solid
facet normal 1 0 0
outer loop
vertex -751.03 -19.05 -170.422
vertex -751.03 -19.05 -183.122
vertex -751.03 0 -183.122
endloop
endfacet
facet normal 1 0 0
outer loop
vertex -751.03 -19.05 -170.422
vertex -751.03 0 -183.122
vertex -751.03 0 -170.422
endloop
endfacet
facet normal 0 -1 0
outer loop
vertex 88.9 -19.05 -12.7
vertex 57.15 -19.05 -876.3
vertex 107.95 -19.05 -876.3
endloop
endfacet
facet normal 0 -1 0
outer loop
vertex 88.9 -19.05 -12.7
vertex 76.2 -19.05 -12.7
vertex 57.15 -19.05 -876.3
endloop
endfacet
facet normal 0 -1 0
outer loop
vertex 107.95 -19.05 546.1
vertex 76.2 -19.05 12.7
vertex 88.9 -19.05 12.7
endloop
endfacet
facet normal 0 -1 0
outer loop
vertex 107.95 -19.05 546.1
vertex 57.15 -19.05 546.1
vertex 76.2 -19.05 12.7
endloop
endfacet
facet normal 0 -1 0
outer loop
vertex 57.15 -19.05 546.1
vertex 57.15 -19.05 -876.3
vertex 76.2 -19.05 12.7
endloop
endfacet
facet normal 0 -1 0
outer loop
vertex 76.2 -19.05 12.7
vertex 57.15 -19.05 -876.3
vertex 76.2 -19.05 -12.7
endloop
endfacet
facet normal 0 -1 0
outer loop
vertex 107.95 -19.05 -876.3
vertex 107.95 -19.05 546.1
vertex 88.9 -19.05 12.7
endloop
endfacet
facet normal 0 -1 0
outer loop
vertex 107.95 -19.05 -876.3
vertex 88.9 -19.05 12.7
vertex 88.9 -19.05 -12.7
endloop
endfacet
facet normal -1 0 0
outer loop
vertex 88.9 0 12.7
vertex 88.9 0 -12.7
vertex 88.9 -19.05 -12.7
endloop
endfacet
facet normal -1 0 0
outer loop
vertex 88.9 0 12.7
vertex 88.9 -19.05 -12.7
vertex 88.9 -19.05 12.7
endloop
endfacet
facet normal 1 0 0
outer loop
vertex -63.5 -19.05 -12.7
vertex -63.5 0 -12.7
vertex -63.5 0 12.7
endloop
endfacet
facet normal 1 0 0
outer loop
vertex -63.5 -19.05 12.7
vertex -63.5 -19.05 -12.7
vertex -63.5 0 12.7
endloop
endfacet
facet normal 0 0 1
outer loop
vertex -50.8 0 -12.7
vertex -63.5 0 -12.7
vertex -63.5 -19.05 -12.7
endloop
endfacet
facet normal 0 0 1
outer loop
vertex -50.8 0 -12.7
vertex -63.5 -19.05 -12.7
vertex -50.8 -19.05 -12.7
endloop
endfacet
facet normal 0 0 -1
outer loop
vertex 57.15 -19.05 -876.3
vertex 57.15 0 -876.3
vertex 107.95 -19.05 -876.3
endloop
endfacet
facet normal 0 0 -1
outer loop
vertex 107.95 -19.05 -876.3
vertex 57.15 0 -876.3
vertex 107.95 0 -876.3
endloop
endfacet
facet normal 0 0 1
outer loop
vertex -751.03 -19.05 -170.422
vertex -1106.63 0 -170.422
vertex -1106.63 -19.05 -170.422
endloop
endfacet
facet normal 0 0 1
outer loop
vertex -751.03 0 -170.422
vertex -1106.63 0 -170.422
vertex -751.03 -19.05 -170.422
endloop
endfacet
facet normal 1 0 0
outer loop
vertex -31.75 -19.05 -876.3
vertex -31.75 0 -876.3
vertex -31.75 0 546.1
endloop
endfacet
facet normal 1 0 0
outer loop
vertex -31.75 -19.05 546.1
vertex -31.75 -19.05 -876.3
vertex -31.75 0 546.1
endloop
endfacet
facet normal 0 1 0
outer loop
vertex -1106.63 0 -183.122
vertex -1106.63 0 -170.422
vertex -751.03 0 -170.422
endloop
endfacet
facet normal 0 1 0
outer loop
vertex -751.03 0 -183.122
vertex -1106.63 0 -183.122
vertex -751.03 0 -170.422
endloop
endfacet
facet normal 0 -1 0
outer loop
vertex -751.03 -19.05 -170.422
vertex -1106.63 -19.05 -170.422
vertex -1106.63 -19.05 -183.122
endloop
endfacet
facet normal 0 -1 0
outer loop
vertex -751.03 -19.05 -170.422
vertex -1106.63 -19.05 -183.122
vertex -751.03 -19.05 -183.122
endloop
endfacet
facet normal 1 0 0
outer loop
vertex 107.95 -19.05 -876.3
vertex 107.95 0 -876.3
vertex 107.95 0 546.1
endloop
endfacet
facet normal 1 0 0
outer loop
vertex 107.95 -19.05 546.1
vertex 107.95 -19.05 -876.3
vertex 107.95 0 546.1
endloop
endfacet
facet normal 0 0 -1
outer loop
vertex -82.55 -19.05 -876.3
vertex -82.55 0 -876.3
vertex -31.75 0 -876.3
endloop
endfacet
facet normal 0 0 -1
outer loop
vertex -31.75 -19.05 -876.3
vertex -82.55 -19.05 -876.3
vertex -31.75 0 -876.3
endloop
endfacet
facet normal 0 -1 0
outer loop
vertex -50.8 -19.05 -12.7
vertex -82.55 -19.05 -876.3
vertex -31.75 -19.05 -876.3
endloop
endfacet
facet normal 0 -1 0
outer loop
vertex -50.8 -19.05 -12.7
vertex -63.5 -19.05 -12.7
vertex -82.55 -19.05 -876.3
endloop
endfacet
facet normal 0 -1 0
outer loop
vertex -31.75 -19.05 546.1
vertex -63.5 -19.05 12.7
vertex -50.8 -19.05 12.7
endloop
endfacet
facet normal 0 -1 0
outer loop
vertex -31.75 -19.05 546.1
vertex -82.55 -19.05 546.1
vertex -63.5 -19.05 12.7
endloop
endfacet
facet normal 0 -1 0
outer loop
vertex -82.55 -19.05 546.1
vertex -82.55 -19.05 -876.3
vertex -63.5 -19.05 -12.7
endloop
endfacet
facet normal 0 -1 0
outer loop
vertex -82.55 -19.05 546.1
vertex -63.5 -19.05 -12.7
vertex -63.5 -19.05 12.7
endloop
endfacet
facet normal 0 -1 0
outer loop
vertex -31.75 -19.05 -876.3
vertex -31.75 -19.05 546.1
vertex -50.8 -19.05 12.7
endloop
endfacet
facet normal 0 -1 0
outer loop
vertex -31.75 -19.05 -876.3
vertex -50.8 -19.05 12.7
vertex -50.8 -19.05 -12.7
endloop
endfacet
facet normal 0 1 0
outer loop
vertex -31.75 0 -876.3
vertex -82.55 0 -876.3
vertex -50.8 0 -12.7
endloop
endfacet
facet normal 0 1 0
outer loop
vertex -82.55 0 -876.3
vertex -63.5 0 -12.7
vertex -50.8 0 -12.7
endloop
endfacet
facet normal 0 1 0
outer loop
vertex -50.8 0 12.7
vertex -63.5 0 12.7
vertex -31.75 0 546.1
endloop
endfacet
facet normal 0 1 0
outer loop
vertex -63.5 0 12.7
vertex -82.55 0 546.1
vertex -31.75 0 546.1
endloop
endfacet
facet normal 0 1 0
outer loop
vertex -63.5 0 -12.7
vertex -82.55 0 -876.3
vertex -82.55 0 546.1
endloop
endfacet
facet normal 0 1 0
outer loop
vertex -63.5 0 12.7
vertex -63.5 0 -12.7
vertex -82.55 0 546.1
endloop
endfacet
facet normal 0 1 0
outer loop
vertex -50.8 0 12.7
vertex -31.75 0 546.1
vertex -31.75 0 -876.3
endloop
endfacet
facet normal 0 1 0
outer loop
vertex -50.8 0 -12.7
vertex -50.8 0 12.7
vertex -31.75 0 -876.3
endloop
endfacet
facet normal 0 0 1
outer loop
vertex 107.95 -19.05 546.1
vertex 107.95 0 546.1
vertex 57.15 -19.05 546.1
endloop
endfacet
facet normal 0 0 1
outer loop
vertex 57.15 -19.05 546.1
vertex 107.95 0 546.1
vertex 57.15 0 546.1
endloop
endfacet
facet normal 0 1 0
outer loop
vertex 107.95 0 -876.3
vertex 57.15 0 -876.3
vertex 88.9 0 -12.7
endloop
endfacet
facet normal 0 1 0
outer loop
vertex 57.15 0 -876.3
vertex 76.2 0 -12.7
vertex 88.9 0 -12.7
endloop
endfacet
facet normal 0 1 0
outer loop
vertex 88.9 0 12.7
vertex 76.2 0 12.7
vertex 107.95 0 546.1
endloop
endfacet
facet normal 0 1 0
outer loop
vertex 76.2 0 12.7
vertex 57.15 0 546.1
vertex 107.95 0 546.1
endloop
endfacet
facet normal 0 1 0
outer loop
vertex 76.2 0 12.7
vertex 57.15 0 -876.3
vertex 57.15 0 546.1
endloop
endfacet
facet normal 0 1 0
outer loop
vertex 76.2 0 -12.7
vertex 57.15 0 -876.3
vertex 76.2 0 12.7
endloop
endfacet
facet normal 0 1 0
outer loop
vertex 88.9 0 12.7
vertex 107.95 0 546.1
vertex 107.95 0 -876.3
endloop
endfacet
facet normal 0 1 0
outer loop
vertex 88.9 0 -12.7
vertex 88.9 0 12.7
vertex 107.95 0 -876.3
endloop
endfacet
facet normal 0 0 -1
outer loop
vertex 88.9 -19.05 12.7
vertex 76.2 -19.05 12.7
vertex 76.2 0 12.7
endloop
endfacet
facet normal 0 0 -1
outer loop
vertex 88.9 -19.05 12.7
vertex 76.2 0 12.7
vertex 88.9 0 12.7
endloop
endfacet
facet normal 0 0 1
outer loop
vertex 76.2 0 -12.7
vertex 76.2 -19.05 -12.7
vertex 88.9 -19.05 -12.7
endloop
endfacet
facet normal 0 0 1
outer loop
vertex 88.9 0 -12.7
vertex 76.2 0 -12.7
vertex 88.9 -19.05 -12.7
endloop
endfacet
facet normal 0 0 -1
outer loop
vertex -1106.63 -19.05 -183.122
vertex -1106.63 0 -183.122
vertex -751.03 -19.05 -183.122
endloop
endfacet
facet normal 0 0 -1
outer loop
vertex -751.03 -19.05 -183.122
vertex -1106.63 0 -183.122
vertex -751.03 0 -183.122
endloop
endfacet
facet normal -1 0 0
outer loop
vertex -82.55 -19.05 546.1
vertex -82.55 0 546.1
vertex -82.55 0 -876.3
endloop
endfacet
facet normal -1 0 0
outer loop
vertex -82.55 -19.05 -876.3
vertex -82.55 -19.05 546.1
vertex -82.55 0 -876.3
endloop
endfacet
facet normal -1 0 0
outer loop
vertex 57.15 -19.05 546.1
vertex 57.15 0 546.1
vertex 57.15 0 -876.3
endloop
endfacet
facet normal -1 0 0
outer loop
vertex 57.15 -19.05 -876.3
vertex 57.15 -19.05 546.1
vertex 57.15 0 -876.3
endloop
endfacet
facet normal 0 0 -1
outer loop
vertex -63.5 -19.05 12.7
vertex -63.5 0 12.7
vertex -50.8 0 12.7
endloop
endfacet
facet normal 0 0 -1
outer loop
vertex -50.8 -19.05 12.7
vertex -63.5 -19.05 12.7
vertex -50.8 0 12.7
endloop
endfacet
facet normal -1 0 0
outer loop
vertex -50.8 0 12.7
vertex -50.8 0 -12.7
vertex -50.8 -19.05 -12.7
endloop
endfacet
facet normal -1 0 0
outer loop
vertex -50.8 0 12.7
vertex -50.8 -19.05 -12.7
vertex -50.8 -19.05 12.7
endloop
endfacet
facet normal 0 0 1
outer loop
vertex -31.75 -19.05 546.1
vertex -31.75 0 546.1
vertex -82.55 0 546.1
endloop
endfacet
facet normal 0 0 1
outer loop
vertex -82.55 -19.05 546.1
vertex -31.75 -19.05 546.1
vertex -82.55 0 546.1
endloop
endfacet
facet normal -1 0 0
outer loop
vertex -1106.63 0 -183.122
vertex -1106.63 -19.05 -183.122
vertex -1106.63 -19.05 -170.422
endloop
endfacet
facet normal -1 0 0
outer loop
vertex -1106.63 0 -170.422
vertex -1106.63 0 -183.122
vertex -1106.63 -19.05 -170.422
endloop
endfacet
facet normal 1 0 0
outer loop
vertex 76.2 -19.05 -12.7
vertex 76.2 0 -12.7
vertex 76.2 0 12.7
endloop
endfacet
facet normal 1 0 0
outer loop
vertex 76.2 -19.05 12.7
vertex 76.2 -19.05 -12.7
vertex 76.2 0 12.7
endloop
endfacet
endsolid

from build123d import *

# Parameters (mm, degrees)
F0_W     = 12.7
F0_H     = 25.4
F0_W_2   = 355.6
F0_H_2   = 12.7
F1_DEPTH = 19.05


with BuildPart() as f1:
    # F0 (on Front) → F1 (new body)
    with BuildSketch(Plane.XZ):
        Polygon((57.15, 546.1), (57.15, 12.7), (57.15, -12.7), (57.15, -876.3), (107.95, -876.3), (107.95, -12.7), (107.95, 12.7), (107.95, 546.1), align=None)
        with Locations((82.55, 0)):
            Rectangle(F0_W, F0_H, mode=Mode.SUBTRACT)
        Polygon((-31.75, 546.1), (-82.55, 546.1), (-82.55, 12.7), (-82.55, -12.7), (-82.55, -876.3), (-31.75, -876.3), (-31.75, -12.7), (-31.75, 12.7), align=None)
        with Locations((-57.15, 0)):
            Rectangle(F0_W, F0_H, mode=Mode.SUBTRACT)
        with Locations((-928.829968, -176.771949)):
            Rectangle(F0_W_2, F0_H_2)
    extrude(amount=F1_DEPTH)


solid = f1.part
